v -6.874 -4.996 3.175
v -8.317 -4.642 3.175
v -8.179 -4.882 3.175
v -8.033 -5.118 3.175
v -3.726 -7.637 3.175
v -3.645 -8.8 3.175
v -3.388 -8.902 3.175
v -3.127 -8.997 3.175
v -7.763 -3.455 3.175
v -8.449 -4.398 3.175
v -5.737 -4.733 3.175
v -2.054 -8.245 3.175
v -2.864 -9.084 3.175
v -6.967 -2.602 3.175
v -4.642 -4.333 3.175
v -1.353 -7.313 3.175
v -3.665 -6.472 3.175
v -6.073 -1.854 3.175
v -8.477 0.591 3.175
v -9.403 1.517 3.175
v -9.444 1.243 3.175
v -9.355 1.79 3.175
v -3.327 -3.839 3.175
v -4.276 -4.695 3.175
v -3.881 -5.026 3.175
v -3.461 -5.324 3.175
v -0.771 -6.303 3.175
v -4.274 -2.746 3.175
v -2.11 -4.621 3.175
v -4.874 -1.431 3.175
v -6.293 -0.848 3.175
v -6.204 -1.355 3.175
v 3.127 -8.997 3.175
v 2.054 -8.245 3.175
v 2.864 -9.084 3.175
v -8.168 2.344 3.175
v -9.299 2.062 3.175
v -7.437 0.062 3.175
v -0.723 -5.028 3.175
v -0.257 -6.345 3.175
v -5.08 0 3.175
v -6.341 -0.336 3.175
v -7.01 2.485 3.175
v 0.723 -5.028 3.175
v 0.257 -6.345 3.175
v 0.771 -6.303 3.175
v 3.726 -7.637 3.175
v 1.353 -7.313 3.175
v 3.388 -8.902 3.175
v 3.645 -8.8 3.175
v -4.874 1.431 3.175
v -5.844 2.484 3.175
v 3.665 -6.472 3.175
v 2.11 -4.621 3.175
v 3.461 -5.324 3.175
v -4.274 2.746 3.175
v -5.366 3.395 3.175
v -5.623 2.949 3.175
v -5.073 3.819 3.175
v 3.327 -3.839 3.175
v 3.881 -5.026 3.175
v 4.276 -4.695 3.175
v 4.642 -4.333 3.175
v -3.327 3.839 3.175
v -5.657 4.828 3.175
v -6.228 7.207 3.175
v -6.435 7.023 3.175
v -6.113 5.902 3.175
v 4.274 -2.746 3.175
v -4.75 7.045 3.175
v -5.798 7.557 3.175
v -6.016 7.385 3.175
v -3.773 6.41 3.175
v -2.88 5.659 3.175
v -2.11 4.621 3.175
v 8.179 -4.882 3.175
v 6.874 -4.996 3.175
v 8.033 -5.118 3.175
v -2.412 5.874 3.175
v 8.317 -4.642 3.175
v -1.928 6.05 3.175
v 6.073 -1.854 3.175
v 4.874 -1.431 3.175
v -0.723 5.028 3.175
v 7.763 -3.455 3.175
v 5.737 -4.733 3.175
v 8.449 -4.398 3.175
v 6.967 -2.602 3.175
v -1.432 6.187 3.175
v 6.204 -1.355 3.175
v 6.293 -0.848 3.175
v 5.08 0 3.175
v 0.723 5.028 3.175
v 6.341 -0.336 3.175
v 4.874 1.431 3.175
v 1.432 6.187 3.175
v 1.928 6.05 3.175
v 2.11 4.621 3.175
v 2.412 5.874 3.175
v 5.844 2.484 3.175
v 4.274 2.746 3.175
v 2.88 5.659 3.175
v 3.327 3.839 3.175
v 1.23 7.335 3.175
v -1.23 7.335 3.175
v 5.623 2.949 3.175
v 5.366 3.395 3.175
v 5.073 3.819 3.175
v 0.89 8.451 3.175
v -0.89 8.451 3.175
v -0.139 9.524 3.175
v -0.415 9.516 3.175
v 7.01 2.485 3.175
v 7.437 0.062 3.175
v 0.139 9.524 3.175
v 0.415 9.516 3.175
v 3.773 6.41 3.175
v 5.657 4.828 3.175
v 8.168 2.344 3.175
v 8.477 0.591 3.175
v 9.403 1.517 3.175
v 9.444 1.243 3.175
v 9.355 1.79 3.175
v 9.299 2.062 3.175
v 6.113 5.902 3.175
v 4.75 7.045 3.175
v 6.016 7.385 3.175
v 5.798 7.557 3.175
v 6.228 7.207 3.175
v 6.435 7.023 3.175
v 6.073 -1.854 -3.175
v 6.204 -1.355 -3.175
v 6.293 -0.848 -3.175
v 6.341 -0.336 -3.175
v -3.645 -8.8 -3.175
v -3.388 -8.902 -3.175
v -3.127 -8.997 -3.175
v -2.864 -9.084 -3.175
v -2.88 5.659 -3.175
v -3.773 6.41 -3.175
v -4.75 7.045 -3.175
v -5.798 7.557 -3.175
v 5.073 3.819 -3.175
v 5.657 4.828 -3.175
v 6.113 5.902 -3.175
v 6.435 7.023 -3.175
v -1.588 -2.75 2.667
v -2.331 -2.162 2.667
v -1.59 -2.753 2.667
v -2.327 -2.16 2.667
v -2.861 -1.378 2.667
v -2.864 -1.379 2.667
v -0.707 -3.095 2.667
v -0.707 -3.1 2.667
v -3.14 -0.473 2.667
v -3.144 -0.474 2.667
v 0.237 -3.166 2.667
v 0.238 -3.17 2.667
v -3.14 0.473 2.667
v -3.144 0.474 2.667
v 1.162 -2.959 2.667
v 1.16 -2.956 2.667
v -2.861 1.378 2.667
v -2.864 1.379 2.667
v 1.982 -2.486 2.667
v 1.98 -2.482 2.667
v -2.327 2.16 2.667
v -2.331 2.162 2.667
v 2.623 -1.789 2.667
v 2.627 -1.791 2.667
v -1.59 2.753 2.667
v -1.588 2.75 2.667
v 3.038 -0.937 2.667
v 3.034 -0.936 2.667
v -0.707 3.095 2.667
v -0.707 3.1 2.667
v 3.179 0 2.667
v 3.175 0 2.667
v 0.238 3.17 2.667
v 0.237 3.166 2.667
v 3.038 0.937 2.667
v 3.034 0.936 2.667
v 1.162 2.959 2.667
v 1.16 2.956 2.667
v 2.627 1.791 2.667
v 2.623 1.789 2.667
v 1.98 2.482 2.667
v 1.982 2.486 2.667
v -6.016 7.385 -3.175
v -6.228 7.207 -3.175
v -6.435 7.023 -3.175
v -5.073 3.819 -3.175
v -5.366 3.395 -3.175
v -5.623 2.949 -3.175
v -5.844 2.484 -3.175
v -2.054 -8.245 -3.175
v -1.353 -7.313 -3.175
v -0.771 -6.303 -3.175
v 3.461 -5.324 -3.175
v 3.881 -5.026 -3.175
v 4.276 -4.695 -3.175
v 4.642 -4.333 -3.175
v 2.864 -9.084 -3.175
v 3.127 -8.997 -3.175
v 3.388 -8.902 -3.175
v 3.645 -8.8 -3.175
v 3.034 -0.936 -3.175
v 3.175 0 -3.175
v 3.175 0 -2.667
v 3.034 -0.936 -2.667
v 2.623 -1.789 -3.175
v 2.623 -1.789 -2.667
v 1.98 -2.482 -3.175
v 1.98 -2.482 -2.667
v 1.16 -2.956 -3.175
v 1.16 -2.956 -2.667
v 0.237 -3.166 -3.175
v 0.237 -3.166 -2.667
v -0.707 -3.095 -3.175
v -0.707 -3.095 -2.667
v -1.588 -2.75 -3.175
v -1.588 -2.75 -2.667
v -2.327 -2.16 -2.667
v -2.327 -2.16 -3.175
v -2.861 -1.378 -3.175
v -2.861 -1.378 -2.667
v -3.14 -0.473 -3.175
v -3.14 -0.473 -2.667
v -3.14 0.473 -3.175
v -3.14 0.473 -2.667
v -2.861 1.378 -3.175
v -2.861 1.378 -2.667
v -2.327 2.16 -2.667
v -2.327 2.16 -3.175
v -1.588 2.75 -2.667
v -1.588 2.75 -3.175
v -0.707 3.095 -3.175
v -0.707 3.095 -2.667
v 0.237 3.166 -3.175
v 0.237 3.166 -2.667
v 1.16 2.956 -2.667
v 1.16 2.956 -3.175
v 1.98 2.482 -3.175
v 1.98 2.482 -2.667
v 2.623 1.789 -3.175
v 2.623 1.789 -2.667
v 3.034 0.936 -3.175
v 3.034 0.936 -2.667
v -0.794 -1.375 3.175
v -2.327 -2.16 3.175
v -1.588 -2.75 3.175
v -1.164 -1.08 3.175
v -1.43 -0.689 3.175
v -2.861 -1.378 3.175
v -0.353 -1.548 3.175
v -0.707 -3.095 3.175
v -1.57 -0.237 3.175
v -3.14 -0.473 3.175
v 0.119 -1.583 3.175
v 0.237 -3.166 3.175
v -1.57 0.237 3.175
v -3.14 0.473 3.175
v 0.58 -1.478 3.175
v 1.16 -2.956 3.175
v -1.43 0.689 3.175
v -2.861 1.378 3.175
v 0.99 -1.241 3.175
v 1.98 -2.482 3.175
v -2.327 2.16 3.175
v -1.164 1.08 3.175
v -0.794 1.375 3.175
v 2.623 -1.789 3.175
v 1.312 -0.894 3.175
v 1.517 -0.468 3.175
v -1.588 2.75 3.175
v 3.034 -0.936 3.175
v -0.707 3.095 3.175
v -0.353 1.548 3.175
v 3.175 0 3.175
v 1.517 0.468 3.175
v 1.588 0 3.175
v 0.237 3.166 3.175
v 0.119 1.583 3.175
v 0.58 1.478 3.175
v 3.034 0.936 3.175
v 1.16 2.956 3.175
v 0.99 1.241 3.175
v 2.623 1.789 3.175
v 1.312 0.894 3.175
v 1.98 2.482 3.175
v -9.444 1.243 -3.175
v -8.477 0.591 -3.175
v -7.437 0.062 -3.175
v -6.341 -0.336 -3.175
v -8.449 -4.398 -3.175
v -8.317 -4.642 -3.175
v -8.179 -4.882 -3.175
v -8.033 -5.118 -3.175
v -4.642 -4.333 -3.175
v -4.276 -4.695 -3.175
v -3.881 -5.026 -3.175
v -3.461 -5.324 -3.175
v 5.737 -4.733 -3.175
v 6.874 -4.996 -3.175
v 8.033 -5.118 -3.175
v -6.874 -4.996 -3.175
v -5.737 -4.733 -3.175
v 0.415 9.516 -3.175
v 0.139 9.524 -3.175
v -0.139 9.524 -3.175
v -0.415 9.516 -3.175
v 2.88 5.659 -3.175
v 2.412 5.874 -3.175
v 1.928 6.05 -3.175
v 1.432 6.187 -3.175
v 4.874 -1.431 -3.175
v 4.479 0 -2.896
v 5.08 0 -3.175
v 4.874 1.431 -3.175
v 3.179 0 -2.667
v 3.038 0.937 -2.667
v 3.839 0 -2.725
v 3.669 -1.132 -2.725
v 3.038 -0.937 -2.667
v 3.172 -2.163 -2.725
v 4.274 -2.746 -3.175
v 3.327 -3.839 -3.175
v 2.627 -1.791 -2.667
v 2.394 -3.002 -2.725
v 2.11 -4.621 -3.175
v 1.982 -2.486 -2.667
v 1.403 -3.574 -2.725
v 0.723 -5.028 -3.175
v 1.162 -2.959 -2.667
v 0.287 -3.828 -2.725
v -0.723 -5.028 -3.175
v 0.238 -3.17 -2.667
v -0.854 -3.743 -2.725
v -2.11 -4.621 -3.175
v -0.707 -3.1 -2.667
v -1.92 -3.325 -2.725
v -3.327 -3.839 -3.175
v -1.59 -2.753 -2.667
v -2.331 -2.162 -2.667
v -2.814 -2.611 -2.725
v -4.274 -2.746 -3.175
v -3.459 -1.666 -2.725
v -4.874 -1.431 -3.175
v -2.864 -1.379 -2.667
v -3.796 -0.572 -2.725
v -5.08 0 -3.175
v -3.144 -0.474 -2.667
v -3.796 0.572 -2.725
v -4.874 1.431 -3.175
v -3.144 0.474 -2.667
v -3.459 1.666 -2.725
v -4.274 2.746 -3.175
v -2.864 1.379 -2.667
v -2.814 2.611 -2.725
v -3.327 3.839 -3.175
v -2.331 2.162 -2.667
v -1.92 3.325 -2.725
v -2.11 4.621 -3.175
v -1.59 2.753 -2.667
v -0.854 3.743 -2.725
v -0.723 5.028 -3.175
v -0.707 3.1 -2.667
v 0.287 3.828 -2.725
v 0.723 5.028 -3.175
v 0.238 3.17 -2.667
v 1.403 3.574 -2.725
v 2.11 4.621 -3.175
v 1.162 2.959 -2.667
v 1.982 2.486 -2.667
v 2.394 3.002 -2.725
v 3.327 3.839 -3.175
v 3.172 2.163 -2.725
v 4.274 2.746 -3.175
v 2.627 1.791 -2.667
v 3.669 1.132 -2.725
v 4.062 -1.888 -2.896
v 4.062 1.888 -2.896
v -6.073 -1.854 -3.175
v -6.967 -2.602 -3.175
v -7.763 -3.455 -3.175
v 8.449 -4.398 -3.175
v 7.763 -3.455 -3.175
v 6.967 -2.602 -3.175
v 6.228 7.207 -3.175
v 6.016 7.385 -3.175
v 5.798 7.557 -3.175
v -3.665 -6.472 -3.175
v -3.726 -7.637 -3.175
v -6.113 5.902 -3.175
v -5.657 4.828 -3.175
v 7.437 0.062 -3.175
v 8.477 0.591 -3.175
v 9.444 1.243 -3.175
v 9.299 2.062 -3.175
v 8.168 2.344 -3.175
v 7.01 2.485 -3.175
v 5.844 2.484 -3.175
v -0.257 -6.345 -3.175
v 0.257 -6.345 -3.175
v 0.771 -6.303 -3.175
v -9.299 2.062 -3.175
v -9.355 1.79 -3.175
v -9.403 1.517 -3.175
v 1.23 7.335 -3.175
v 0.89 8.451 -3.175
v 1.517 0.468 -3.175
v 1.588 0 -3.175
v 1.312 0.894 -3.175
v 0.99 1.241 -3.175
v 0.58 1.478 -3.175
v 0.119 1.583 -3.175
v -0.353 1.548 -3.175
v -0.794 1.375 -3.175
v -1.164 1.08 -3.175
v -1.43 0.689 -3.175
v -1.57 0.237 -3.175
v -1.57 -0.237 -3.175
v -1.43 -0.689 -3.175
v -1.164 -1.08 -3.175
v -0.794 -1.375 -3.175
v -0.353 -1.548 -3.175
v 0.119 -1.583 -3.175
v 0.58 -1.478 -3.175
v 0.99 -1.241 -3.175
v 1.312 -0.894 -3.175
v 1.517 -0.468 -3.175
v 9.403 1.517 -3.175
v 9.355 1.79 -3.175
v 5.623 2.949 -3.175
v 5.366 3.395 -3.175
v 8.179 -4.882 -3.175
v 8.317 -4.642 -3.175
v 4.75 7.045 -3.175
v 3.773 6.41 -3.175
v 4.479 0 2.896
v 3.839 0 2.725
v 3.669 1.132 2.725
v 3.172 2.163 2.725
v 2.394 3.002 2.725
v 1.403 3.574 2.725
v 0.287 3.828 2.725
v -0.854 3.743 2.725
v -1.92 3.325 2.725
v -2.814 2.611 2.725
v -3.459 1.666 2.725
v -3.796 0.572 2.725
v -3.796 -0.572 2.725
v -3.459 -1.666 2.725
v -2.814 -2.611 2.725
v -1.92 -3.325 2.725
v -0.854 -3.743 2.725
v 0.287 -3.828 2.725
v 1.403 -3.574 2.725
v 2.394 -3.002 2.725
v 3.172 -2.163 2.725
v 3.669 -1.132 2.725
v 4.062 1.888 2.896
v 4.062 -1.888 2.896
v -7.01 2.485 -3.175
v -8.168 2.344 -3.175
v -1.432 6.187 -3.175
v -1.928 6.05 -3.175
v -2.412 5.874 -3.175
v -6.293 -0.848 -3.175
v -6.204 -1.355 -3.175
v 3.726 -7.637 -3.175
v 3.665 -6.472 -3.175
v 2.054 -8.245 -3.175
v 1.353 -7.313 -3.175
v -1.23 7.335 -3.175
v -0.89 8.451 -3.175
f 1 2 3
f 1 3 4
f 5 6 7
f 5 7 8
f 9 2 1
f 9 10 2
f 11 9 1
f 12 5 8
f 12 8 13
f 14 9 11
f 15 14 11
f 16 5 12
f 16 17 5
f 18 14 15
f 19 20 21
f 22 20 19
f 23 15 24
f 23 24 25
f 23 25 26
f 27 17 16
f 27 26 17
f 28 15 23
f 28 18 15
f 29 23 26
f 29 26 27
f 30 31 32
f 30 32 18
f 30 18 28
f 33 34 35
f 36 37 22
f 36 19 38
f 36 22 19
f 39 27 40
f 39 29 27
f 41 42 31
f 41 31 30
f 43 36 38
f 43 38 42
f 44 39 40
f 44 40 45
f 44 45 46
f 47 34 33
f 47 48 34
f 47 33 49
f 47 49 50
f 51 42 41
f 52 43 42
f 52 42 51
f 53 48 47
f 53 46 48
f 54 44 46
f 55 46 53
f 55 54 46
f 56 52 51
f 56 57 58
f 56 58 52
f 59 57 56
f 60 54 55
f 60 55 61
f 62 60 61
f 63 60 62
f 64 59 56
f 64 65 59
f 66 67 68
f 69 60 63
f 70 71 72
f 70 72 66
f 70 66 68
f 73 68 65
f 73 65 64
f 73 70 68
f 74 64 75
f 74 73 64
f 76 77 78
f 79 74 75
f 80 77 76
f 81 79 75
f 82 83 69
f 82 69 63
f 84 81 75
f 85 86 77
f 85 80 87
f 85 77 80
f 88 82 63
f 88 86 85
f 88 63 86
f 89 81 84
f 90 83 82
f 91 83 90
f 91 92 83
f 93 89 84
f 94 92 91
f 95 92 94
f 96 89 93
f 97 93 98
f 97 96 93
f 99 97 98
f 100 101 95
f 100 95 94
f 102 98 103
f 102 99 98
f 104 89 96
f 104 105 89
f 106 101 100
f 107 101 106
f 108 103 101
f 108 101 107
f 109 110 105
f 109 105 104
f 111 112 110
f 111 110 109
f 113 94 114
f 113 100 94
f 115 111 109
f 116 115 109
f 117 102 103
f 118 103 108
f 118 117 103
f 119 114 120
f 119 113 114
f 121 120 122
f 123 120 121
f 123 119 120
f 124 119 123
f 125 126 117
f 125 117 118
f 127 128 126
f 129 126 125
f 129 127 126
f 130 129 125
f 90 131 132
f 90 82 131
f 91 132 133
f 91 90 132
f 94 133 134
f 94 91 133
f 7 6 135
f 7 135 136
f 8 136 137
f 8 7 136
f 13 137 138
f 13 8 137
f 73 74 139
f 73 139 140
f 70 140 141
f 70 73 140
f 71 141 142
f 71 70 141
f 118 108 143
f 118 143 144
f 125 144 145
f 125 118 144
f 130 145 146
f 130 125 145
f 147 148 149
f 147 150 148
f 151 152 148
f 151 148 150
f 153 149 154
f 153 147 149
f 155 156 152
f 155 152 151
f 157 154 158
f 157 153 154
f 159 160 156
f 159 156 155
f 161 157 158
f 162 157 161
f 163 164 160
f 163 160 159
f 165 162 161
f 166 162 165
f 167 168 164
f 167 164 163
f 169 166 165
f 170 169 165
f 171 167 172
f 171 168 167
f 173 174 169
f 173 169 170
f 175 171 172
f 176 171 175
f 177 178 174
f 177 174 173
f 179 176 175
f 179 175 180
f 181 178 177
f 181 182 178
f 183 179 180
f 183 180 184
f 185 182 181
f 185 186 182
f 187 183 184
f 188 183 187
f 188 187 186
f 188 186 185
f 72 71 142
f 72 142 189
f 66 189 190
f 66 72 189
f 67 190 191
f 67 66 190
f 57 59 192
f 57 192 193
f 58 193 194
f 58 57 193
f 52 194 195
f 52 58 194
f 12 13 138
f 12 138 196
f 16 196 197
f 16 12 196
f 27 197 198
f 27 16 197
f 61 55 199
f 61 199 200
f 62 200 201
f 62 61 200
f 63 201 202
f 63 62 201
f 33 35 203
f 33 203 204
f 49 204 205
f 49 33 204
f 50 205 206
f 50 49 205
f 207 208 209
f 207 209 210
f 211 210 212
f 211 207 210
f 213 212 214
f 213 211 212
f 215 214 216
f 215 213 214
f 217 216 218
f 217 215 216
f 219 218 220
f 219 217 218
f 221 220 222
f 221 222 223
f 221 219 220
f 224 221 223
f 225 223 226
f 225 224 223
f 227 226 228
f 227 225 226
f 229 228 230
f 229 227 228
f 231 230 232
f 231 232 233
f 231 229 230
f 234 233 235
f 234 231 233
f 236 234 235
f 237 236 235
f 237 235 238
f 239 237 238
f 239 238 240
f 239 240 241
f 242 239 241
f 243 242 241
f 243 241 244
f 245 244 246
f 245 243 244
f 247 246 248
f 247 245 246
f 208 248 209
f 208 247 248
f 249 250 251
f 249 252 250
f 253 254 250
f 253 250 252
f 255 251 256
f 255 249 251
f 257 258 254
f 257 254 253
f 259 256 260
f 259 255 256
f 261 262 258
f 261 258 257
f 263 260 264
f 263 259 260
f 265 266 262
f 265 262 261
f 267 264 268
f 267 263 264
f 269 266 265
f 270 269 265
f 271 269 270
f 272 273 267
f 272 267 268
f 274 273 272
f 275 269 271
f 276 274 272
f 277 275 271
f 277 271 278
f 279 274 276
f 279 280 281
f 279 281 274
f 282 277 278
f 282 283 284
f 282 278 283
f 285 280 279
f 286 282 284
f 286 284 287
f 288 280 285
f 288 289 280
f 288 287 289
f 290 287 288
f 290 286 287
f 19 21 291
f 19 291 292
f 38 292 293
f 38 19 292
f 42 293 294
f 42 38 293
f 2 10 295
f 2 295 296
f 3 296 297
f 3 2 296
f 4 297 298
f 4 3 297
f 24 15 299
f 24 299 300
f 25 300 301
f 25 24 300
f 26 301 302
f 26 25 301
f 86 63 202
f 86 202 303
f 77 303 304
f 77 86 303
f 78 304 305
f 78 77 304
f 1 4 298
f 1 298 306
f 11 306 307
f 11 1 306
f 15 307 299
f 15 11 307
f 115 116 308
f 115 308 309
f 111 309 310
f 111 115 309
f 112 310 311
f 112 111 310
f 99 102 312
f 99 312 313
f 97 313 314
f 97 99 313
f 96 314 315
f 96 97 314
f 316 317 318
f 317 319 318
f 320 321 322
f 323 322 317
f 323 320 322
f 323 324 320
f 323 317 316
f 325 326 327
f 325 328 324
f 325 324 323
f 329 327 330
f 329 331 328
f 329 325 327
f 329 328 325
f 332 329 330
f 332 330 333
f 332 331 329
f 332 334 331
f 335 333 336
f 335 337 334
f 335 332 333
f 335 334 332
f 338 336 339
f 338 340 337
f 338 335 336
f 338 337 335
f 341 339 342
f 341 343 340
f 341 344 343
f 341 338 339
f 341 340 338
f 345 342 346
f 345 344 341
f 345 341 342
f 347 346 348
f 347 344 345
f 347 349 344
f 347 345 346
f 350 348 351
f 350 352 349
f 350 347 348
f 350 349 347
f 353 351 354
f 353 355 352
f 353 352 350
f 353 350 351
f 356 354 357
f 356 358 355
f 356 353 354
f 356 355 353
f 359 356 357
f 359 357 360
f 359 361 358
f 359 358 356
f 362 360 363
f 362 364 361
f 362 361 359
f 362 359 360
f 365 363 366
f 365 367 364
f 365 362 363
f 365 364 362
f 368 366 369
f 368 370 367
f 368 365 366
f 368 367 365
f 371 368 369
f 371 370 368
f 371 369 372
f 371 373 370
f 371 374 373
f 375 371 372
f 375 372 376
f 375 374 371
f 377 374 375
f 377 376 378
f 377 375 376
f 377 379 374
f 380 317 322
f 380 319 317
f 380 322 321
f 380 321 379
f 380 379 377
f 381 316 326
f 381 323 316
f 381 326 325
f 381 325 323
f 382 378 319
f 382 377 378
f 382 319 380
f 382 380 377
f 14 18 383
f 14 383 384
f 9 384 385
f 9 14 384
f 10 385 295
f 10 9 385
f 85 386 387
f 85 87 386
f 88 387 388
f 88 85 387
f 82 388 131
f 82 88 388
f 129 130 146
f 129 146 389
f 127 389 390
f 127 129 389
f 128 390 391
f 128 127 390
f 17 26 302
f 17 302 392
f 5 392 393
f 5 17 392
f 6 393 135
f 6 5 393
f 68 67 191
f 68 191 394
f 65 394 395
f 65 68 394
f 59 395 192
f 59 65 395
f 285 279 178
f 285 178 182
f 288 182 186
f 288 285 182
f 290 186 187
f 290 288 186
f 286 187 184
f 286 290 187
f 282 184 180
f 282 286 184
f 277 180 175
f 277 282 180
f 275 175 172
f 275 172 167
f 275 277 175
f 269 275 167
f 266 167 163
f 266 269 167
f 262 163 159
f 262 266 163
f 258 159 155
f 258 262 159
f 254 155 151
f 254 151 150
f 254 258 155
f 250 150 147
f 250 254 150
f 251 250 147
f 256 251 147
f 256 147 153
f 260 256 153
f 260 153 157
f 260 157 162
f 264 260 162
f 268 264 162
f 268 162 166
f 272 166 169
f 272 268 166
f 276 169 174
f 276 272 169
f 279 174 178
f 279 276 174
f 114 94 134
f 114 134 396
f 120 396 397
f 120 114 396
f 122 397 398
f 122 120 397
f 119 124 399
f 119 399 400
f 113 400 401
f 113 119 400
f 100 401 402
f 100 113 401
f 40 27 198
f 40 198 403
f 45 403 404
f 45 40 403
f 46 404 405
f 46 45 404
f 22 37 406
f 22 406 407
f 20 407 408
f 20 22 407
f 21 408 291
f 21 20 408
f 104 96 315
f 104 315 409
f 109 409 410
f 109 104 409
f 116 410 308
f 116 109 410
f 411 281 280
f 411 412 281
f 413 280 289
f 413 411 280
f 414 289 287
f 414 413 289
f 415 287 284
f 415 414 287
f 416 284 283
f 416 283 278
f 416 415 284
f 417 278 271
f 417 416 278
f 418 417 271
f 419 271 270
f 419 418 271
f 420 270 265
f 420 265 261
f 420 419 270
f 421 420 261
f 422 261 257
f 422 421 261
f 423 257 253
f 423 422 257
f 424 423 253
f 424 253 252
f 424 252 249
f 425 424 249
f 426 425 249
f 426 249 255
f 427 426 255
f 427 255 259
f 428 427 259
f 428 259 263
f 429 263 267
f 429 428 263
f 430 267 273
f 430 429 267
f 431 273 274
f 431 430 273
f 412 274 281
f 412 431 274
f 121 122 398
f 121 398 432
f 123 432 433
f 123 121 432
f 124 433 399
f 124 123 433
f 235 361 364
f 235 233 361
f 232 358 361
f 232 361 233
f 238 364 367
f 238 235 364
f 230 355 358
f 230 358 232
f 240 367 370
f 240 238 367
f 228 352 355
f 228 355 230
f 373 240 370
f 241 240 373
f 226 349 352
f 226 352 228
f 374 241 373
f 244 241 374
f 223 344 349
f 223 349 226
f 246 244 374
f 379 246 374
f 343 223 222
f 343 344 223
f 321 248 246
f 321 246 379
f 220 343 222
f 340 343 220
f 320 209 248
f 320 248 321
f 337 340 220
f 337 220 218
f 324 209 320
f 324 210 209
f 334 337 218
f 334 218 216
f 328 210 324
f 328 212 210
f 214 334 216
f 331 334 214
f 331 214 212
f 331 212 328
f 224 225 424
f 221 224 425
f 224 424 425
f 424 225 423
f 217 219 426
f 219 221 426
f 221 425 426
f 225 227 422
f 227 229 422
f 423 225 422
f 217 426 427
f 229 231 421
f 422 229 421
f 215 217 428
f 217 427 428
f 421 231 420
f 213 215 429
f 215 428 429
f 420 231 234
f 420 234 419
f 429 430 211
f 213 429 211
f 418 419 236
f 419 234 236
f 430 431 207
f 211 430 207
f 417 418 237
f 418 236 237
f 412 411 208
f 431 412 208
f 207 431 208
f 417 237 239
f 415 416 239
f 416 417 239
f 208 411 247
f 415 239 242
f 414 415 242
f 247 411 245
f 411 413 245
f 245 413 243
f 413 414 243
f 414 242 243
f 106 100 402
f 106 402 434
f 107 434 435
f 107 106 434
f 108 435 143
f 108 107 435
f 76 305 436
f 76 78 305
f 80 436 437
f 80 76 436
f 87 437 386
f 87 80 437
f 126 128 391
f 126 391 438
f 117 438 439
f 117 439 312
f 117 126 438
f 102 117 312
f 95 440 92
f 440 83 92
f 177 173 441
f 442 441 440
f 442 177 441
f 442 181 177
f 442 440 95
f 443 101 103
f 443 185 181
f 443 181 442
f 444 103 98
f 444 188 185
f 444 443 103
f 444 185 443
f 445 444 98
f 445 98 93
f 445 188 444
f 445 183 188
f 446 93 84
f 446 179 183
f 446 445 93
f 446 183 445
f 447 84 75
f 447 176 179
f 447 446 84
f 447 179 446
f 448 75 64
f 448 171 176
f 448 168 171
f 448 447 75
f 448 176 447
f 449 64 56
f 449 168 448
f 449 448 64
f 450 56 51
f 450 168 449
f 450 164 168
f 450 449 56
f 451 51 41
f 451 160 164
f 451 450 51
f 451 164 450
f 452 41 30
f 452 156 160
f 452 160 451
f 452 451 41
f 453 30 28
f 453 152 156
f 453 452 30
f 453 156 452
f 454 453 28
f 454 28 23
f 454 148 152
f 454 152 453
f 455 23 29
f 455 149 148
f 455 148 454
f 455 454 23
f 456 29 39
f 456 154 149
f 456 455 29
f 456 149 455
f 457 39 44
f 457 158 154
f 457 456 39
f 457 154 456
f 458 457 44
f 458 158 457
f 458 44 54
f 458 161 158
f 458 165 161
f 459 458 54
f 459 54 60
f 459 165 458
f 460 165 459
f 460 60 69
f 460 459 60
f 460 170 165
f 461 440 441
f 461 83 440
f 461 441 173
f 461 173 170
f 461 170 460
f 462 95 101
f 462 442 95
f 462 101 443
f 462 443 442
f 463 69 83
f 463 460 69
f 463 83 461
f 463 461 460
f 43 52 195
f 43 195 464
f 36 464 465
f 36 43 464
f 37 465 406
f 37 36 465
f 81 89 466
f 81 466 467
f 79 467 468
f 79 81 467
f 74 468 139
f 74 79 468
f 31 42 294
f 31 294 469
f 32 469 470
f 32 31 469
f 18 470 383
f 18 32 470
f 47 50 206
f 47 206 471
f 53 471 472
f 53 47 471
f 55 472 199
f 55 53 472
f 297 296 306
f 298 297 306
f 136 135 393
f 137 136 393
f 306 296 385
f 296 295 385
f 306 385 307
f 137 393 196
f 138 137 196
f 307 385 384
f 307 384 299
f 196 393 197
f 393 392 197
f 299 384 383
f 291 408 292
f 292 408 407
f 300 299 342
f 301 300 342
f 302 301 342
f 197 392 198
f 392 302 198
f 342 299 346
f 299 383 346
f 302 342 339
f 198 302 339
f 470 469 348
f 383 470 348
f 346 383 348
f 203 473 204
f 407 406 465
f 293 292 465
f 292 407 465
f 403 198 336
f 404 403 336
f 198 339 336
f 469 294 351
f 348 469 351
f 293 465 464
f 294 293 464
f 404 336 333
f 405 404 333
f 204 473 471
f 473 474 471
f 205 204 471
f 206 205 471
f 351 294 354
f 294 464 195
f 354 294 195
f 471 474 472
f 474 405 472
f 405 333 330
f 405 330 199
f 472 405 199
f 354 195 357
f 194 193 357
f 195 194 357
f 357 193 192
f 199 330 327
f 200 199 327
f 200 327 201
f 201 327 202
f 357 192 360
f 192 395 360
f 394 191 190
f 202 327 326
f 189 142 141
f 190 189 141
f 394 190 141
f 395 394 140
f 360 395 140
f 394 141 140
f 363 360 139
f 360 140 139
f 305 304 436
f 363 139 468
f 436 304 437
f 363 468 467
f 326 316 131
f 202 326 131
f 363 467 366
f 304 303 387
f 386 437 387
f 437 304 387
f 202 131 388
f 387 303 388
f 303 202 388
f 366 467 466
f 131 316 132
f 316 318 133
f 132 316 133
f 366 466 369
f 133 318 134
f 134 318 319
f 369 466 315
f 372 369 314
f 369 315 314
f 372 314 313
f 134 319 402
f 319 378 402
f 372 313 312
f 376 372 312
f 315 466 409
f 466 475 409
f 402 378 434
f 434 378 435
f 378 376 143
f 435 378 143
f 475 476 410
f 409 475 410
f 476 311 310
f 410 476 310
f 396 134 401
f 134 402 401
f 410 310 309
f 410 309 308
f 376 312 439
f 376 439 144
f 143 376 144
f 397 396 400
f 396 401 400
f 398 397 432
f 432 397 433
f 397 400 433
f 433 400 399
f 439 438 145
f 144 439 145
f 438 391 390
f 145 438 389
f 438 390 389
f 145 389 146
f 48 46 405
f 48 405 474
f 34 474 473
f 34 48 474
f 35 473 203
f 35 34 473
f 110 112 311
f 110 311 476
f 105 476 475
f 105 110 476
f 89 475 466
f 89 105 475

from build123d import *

# Parameters (mm, degrees)
F0_R     = 4.7625
F0_R_2   = 3.175
F0_R_3   = 1.5875
F1_DEPTH = 3.175
F2_R     = 5.08
F2_R_2   = 3.175
F3_DEPTH = 0.508
F4_R     = 5.08
F4_R_2   = 3.175
F5_DEPTH = 0.508


# Not quite as in the source:
# - a fillet or chamfer that OpenCascade refuses, or shapes differently, is made with other operations: its cross-section is extruded or revolved along the edge and cut away or added


with BuildPart() as f1:
    # F0 (on Top) → F1 (new body, symmetric)
    with BuildSketch(Plane.XY):
        with BuildLine():
            ThreePointArc((6.3411298165, -0.3355184801), (6.3477820668, -0.1678178556), (6.35, 0))
            ThreePointArc((6.35, 0), (6.222203729, 1.2675491134), (5.8439588173, 2.4840783686))
            ThreePointArc((5.8439588173, 2.4840783686), (5.499261314, 3.175), (5.0732543809, 3.8189776102))
            ThreePointArc((5.0732543809, 3.8189776102), (4.0817013215, 4.8643822138), (2.879997381, 5.6593387498))
            ThreePointArc((2.879997381, 5.6593387498), (2.1718279101, 5.967048142), (1.4315468375, 6.1865316335))
            ThreePointArc((1.4315468375, 6.1865316335), (0, 6.35), (-1.4315468375, 6.1865316335))
            ThreePointArc((-1.4315468375, 6.1865316335), (-2.1718279101, 5.967048142), (-2.879997381, 5.6593387498))
            ThreePointArc((-2.879997381, 5.6593387498), (-4.0817013215, 4.8643822138), (-5.0732543809, 3.8189776102))
            ThreePointArc((-5.0732543809, 3.8189776102), (-5.499261314, 3.175), (-5.8439588173, 2.4840783686))
            ThreePointArc((-5.8439588173, 2.4840783686), (-6.2535292316, 1.1026659282), (-6.3411298165, -0.3355184801))
            ThreePointArc((-6.3411298165, -0.3355184801), (-6.2535292316, -1.1026659282), (-6.0734669747, -1.8535098888))
            ThreePointArc((-6.0734669747, -1.8535098888), (-5.499261314, -3.175), (-4.6419201372, -4.3330217447))
            ThreePointArc((-4.6419201372, -4.3330217447), (-4.0817013215, -4.8643822138), (-3.4611324355, -5.3238202697))
            ThreePointArc((-3.4611324355, -5.3238202697), (-2.1718279101, -5.967048142), (-0.7707044365, -6.3030559788))
            ThreePointArc((-0.7707044365, -6.3030559788), (0, -6.35), (0.7707044365, -6.3030559788))
            ThreePointArc((0.7707044365, -6.3030559788), (2.1718279101, -5.967048142), (3.4611324355, -5.3238202697))
            ThreePointArc((3.4611324355, -5.3238202697), (4.0817013215, -4.8643822138), (4.6419201372, -4.3330217447))
            ThreePointArc((4.6419201372, -4.3330217447), (5.499261314, -3.175), (6.0734669747, -1.8535098888))
            ThreePointArc((6.0734669747, -1.8535098888), (6.2535292316, -1.1026659282), (6.3411298165, -0.3355184801))
        make_face()
        Circle(F0_R, mode=Mode.SUBTRACT)
        Circle(F0_R)
        Circle(F0_R_2, mode=Mode.SUBTRACT)
        Circle(F0_R_2)
        Circle(F0_R_3, mode=Mode.SUBTRACT)
        with BuildLine():
            ThreePointArc((5.8439588173, 2.4840783686), (6.222203729, 1.2675491134), (6.35, 0))
            ThreePointArc((6.35, 0), (6.3477820668, -0.1678178556), (6.3411298165, -0.3355184801))
            ThreePointArc((6.3411298165, -0.3355184801), (7.9650557648, 0.3109444224), (9.4435123046, 1.2432619809))
            ThreePointArc((9.4435123046, 1.2432619809), (9.3802938474, 1.6539988923), (9.2992194678, 2.0615873228))
            ThreePointArc((9.2992194678, 2.0615873228), (7.5910533822, 2.4320173351), (5.8439588173, 2.4840783686))
        make_face()
        with BuildLine():
            ThreePointArc((2.879997381, 5.6593387498), (4.0817013215, 4.8643822138), (5.0732543809, 3.8189776102))
            ThreePointArc((5.0732543809, 3.8189776102), (5.9017154857, 5.358036403), (6.4349967275, 7.0225666331))
            ThreePointArc((6.4349967275, 7.0225666331), (6.1225519823, 7.2965733207), (5.7984526113, 7.5566905663))
            ThreePointArc((5.7984526113, 7.5566905663), (4.2518136514, 6.7424684237), (2.879997381, 5.6593387498))
        make_face()
        with BuildLine():
            ThreePointArc((8.448778186, -4.3981555411), (7.3783548704, -3.0164016935), (6.0734669747, -1.8535098888))
            ThreePointArc((6.0734669747, -1.8535098888), (5.499261314, -3.175), (4.6419201372, -4.3330217447))
            ThreePointArc((4.6419201372, -4.3330217447), (6.3014579298, -4.8816419092), (8.0333035214, -5.1177787695))
            ThreePointArc((8.0333035214, -5.1177787695), (8.248891971, -4.7625), (8.448778186, -4.3981555411))
        make_face()
        with BuildLine():
            ThreePointArc((-1.4315468375, 6.1865316335), (0, 6.35), (1.4315468375, 6.1865316335))
            ThreePointArc((1.4315468375, 6.1865316335), (1.0768969406, 7.8980436026), (0.4154746647, 9.5159343106))
            ThreePointArc((0.4154746647, 9.5159343106), (0, 9.525), (-0.4154746647, 9.5159343106))
            ThreePointArc((-0.4154746647, 9.5159343106), (-1.0768969406, 7.8980436026), (-1.4315468375, 6.1865316335))
        make_face()
        with BuildLine():
            ThreePointArc((3.6450596933, -8.7999525472), (3.7132421134, -7.0534128461), (3.4611324355, -5.3238202697))
            ThreePointArc((3.4611324355, -5.3238202697), (2.1718279101, -5.967048142), (0.7707044365, -6.3030559788))
            ThreePointArc((0.7707044365, -6.3030559788), (1.6893378965, -7.790053738), (2.8642227403, -9.0841539559))
            ThreePointArc((2.8642227403, -9.0841539559), (3.2577418652, -8.950572213), (3.6450596933, -8.7999525472))
        make_face()
        with BuildLine():
            ThreePointArc((-5.0732543809, 3.8189776102), (-4.0817013215, 4.8643822138), (-2.879997381, 5.6593387498))
            ThreePointArc((-2.879997381, 5.6593387498), (-4.2518136514, 6.7424684237), (-5.7984526113, 7.5566905663))
            ThreePointArc((-5.7984526113, 7.5566905663), (-6.1225519823, 7.2965733207), (-6.4349967275, 7.0225666331))
            ThreePointArc((-6.4349967275, 7.0225666331), (-5.9017154857, 5.358036403), (-5.0732543809, 3.8189776102))
        make_face()
        with BuildLine():
            ThreePointArc((-2.8642227403, -9.0841539559), (-1.6893378965, -7.790053738), (-0.7707044365, -6.3030559788))
            ThreePointArc((-0.7707044365, -6.3030559788), (-2.1718279101, -5.967048142), (-3.4611324355, -5.3238202697))
            ThreePointArc((-3.4611324355, -5.3238202697), (-3.7132421134, -7.0534128461), (-3.6450596933, -8.7999525472))
            ThreePointArc((-3.6450596933, -8.7999525472), (-3.2577418652, -8.950572213), (-2.8642227403, -9.0841539559))
        make_face()
        with BuildLine():
            ThreePointArc((-6.3411298165, -0.3355184801), (-6.2535292316, 1.1026659282), (-5.8439588173, 2.4840783686))
            ThreePointArc((-5.8439588173, 2.4840783686), (-7.5910533822, 2.4320173351), (-9.2992194678, 2.0615873228))
            ThreePointArc((-9.2992194678, 2.0615873228), (-9.3802938474, 1.6539988923), (-9.4435123046, 1.2432619809))
            ThreePointArc((-9.4435123046, 1.2432619809), (-7.9650557648, 0.3109444224), (-6.3411298165, -0.3355184801))
        make_face()
        with BuildLine():
            ThreePointArc((-8.0333035214, -5.1177787695), (-6.3014579298, -4.8816419092), (-4.6419201372, -4.3330217447))
            ThreePointArc((-4.6419201372, -4.3330217447), (-5.499261314, -3.175), (-6.0734669747, -1.8535098888))
            ThreePointArc((-6.0734669747, -1.8535098888), (-7.3783548704, -3.0164016935), (-8.448778186, -4.3981555411))
            ThreePointArc((-8.448778186, -4.3981555411), (-8.248891971, -4.7625), (-8.0333035214, -5.1177787695))
        make_face()
    extrude(amount=F1_DEPTH, both=True)

    # F2 (on face) → F3 (cut)
    with BuildSketch(Plane(origin=(0, 0, -3.175), x_dir=(1, 0, 0), z_dir=(0, 0, -1))):
        Circle(F2_R)
        Circle(F2_R_2, mode=Mode.SUBTRACT)
    extrude(amount=-F3_DEPTH, mode=Mode.SUBTRACT)

    # F4 (on face) → F5 (cut)
    with BuildSketch(Plane.XY.offset(3.175)):
        Circle(F4_R)
        Circle(F4_R_2, mode=Mode.SUBTRACT)
    extrude(amount=-F5_DEPTH, mode=Mode.SUBTRACT)

    # F6: fillet of radius 3.81 on 2 edges, made by hand

    # F6_s1 → F6_t2 (revolve)
    with BuildSketch(Plane.XZ):
        with BuildLine():
            ThreePointArc((5.08, 3.175), (4.1629758175, 2.7961903065), (3.1792380475, 2.667))
            Line((3.1792380475, 2.667), (5.08, 2.667))
            Line((5.08, 2.667), (5.08, 3.175))
        make_face()
    revolve(axis=Axis((0, 0, 2.667), (0, 0, 1)))

    # F6_s3 → F6_t4 (revolve)
    with BuildSketch(Plane.XZ):
        with BuildLine():
            ThreePointArc((5.08, -3.175), (4.1629758175, -2.7961903065), (3.1792380475, -2.667))
            Line((3.1792380475, -2.667), (5.08, -2.667))
            Line((5.08, -2.667), (5.08, -3.175))
        make_face()
    revolve(axis=Axis((0, 0, -2.667), (0, 0, -1)))


solid = f1.part
